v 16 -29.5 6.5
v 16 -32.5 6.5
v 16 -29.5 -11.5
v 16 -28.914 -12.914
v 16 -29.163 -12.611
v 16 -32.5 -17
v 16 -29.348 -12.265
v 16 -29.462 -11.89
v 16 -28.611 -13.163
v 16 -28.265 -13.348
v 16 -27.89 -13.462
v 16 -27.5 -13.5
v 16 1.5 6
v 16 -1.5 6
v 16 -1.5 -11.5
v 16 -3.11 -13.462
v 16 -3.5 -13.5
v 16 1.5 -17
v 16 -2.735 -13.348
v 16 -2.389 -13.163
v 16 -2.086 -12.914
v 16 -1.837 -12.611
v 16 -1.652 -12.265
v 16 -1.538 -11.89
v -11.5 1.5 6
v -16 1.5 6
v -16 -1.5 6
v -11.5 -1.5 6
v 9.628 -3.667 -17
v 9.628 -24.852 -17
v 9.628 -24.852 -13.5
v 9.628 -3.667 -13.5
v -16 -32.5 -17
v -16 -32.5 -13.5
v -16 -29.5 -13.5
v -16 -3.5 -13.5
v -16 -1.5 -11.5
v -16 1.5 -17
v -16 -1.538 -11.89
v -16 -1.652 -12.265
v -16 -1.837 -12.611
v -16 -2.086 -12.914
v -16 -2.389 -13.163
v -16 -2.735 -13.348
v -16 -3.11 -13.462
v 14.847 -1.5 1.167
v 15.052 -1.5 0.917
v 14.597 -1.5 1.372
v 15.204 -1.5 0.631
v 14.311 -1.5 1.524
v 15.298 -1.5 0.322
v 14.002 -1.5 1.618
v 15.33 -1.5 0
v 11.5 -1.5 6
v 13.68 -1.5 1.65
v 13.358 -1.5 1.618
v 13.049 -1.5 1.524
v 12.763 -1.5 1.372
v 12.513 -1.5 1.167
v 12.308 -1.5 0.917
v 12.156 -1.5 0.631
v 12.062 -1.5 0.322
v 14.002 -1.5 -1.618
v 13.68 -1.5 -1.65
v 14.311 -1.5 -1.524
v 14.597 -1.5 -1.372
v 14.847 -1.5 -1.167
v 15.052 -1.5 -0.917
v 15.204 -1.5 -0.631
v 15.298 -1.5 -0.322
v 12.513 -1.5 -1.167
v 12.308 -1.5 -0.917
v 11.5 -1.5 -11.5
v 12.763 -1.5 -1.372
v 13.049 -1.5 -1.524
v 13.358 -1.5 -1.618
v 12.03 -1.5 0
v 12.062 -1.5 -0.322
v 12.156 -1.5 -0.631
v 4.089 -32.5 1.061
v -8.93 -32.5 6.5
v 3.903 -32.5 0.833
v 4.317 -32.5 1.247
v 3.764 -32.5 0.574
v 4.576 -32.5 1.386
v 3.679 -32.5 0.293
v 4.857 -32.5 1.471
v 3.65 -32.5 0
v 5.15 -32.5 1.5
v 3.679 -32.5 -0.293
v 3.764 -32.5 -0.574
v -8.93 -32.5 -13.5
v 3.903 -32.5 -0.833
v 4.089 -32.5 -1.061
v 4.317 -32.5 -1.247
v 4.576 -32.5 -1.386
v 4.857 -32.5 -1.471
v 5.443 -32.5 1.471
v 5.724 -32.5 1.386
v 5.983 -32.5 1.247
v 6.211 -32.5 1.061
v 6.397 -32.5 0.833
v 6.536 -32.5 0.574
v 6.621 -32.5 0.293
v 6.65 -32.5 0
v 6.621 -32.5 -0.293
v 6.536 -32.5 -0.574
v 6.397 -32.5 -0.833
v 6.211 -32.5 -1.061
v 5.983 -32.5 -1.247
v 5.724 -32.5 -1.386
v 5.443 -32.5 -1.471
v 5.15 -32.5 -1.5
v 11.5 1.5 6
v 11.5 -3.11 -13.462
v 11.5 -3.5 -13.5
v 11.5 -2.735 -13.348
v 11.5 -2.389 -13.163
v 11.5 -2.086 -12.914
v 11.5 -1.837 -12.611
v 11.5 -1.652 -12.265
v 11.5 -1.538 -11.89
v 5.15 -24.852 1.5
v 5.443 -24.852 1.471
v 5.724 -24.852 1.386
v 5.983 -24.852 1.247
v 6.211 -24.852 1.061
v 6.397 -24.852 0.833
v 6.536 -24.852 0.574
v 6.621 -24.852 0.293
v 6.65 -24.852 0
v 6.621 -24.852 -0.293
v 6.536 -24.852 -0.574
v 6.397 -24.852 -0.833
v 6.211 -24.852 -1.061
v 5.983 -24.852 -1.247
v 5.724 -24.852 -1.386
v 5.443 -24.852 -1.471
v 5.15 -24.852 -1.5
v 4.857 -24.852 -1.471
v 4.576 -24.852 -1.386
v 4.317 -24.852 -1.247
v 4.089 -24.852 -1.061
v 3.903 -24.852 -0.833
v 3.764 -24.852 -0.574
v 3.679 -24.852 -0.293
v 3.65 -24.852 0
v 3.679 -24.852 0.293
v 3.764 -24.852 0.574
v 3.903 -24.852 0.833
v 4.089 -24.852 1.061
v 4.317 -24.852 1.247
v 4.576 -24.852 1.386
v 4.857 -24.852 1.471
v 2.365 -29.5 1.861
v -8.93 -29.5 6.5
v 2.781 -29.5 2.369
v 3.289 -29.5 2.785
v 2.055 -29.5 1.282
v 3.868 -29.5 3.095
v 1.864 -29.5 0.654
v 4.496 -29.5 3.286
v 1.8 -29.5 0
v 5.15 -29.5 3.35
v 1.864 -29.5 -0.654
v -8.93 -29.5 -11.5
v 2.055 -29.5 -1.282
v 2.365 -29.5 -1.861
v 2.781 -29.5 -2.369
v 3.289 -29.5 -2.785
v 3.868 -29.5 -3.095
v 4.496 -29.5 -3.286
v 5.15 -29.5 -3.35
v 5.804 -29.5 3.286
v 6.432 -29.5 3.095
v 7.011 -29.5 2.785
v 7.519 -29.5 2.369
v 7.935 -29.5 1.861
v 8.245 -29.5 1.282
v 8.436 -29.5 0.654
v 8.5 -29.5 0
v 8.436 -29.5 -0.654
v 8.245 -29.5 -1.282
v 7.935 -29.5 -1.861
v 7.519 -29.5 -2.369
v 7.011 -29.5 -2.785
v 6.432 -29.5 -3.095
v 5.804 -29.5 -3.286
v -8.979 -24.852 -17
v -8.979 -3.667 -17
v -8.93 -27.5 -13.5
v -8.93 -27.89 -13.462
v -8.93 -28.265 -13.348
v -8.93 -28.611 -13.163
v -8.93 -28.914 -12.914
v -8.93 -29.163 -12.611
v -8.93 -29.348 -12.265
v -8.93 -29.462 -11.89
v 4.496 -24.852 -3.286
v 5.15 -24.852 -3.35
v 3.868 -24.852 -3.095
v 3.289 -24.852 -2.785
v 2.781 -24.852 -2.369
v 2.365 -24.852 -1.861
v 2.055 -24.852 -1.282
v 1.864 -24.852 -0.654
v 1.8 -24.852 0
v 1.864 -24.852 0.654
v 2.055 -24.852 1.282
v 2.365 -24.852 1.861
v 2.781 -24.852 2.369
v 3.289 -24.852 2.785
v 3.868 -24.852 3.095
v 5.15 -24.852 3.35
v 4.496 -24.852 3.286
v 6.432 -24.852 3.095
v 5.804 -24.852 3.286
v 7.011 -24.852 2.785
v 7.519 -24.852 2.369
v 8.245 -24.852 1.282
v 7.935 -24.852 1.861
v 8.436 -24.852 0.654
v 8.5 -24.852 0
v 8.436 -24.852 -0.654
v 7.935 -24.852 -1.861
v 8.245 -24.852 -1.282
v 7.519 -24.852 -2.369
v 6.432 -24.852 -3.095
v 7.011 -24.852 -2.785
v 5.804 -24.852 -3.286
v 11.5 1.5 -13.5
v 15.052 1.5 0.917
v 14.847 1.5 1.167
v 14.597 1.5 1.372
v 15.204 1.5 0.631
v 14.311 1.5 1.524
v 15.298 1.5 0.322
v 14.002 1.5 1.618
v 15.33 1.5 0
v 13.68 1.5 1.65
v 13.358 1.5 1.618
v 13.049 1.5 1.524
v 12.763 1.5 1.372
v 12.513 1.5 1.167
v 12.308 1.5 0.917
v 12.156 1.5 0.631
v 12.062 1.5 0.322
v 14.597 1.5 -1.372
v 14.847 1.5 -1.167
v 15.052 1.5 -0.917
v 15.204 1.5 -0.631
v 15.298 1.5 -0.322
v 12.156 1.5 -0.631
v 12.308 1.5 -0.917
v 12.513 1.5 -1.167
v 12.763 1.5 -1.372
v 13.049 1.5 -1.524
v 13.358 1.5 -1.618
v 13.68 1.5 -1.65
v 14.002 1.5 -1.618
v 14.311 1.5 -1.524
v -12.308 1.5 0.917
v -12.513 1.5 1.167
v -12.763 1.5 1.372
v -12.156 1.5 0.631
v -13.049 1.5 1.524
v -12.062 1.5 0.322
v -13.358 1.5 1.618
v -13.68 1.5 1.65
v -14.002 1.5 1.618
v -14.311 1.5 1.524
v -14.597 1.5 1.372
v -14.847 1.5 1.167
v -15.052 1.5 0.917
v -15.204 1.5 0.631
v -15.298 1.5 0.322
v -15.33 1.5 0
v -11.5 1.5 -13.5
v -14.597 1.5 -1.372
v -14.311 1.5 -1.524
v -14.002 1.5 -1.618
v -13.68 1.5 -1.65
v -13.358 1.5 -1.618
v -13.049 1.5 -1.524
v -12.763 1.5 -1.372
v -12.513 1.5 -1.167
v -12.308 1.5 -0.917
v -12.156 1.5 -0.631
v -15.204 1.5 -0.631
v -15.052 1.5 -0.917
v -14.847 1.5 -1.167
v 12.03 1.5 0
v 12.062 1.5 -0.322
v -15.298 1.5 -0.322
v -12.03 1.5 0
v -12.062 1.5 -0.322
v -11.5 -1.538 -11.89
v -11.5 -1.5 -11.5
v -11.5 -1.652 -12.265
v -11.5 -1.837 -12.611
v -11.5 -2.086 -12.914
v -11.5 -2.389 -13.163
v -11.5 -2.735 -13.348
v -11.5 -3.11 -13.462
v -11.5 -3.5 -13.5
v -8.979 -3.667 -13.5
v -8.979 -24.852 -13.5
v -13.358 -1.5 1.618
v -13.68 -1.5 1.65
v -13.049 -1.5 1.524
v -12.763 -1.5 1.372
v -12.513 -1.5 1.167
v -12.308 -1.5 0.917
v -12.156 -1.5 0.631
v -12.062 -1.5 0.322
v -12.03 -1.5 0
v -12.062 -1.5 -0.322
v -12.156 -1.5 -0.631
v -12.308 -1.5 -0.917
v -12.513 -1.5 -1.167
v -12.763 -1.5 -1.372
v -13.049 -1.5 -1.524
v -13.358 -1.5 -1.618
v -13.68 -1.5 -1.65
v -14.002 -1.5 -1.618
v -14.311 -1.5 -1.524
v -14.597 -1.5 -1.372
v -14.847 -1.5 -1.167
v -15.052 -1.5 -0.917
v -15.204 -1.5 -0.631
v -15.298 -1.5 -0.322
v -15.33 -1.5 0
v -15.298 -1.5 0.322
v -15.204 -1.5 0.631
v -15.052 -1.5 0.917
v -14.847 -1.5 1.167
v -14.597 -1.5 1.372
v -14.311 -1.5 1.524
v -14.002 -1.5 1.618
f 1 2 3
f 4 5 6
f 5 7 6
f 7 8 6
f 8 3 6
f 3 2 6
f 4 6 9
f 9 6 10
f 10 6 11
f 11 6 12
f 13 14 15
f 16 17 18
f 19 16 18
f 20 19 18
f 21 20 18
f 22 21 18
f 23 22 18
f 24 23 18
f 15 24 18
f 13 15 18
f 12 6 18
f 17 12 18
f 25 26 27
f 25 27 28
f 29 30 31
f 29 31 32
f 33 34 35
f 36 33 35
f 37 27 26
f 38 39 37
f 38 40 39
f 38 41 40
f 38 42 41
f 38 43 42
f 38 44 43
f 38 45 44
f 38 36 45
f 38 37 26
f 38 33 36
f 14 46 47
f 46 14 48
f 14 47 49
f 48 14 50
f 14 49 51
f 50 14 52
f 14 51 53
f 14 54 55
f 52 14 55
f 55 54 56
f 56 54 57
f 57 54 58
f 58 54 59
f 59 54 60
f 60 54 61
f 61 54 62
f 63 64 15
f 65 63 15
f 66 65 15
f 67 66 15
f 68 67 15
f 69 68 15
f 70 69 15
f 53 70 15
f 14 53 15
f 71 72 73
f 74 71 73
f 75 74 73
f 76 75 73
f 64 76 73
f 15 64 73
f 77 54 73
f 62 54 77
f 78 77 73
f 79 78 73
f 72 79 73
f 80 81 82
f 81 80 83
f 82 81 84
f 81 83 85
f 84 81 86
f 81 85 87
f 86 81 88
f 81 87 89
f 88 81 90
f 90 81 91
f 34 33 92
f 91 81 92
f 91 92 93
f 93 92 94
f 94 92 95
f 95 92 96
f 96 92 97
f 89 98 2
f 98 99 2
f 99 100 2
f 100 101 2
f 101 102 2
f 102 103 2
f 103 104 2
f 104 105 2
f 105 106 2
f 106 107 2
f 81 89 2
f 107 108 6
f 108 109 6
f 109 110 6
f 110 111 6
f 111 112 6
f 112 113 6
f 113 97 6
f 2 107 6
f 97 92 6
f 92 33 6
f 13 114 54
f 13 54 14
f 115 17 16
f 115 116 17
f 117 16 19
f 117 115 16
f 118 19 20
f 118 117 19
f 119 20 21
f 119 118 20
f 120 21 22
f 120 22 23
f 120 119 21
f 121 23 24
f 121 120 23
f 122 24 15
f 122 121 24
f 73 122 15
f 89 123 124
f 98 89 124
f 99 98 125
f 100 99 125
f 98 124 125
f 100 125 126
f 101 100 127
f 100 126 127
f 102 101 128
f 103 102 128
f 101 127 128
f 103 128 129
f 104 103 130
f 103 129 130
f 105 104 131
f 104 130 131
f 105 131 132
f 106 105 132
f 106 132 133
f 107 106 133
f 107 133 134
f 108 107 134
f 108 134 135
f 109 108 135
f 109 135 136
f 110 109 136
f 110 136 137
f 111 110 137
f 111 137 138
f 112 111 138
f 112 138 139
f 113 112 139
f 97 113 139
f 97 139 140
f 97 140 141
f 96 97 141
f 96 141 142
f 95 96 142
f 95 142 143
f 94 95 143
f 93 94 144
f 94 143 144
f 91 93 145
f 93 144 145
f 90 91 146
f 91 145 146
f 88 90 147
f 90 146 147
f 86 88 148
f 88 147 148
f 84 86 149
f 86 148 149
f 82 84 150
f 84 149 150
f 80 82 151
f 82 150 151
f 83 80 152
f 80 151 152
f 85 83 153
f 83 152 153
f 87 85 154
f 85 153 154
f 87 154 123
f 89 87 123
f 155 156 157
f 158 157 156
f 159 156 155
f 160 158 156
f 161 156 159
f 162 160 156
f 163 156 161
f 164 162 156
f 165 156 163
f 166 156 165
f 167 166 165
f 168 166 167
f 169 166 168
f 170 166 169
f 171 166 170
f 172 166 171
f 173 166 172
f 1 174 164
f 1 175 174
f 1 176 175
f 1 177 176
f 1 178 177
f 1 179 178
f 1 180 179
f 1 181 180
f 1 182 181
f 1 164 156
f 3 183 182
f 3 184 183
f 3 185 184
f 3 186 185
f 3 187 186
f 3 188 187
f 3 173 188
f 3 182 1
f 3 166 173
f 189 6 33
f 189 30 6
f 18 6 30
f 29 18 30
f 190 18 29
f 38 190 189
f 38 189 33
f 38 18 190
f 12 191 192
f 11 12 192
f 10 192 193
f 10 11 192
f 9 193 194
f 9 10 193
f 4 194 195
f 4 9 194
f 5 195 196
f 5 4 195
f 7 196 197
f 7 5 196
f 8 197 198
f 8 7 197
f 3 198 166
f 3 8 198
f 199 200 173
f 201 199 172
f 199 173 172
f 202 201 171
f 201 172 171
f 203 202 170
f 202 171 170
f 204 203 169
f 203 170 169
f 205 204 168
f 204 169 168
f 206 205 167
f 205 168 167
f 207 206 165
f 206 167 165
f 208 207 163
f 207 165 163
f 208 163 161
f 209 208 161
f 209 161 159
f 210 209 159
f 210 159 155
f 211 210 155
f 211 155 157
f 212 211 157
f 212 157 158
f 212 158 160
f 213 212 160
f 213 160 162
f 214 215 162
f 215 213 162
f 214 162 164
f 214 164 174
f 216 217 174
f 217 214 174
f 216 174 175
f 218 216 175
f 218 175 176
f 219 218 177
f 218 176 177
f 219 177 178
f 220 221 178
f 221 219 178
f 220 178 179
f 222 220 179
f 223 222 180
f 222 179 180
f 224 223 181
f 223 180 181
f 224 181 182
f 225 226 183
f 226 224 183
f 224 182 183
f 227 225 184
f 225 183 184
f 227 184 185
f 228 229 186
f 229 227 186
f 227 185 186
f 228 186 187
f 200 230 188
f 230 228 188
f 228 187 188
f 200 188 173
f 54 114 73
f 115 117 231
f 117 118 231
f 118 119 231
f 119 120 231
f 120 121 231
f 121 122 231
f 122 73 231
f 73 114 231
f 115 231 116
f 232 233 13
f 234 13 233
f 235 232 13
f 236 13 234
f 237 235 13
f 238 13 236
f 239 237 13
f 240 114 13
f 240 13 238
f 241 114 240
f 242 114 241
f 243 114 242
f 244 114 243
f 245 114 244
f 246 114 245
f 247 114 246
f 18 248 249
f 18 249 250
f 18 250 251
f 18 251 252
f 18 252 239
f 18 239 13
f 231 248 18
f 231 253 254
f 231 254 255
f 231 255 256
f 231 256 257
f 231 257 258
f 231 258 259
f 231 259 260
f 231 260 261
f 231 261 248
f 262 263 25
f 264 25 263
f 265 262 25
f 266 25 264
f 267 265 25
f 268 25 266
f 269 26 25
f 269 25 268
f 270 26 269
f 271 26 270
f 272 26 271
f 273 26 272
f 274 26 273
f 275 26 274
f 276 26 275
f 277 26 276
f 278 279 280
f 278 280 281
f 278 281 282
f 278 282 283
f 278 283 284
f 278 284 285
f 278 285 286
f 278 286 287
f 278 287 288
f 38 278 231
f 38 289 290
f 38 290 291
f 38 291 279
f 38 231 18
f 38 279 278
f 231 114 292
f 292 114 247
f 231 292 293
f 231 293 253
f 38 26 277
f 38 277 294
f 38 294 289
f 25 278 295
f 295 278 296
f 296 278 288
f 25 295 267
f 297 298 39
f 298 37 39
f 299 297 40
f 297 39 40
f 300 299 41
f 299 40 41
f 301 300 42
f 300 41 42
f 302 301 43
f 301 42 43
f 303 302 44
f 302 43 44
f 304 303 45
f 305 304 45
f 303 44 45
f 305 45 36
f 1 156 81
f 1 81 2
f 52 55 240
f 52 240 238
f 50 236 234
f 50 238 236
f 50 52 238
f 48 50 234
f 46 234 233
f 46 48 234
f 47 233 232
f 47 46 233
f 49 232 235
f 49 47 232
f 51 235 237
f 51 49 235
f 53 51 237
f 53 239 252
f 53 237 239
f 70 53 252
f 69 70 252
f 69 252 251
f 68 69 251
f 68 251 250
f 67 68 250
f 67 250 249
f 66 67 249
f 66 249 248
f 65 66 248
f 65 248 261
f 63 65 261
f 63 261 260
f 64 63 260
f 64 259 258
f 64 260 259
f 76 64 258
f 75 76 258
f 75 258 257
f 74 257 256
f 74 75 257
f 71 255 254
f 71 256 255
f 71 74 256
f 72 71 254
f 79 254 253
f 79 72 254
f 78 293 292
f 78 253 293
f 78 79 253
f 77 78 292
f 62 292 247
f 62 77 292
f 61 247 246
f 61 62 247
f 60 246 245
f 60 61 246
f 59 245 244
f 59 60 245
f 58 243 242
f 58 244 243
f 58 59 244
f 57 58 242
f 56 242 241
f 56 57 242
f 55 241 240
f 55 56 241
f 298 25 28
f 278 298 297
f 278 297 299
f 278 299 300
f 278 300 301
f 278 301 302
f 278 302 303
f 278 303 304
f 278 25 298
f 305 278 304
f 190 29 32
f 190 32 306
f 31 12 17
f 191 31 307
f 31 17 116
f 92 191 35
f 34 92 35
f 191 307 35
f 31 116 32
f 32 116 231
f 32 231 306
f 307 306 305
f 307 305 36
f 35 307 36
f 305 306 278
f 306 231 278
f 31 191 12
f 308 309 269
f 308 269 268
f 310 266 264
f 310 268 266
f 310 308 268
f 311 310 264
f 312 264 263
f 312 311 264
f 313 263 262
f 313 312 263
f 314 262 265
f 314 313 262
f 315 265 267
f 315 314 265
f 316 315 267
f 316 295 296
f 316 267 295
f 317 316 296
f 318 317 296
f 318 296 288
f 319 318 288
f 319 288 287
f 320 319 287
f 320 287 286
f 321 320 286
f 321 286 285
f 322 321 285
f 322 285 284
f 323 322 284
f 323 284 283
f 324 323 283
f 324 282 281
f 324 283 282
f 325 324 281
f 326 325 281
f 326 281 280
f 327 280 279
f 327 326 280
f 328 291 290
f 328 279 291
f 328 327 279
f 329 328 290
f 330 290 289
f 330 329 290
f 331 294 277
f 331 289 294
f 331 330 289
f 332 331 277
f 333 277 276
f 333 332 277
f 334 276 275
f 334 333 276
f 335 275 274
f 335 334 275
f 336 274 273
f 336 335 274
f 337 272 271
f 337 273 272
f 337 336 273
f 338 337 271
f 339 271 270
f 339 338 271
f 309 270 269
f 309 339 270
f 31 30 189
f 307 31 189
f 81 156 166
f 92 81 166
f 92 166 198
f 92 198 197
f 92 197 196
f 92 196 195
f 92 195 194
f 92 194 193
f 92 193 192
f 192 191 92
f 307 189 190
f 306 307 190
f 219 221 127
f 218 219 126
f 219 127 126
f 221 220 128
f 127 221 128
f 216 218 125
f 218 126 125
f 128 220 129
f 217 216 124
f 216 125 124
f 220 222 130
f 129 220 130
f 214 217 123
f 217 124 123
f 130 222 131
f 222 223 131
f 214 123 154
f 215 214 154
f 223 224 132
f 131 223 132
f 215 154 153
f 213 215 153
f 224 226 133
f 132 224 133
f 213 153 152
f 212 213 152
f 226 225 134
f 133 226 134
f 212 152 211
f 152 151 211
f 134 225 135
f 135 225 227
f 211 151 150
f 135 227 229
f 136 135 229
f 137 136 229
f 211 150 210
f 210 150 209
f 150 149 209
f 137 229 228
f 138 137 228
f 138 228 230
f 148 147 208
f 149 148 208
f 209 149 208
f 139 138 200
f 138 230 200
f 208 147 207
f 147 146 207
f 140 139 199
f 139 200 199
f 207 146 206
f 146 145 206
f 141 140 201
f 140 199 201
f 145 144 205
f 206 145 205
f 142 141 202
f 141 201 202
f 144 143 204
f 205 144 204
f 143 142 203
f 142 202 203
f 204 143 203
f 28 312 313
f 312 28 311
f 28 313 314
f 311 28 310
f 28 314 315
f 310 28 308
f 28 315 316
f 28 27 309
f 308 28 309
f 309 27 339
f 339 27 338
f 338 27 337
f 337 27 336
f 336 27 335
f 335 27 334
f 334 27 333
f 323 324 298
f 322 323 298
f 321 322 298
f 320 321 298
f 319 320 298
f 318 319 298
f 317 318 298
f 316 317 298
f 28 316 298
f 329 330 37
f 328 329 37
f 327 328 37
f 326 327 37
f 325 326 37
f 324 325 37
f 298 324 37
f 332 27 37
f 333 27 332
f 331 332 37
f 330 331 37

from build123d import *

# Parameters (mm, degrees)
SKETCH_1_W               = 4.5
SKETCH_1_H               = 23
EXTRUDE_1_DEPTH          = 1.5
EXTRUDE_1_2_DEPTH        = 1.5
CUT_EXTRUDE_1_DEPTH      = 24.393375131
CUT_EXTRUDE_1_DEPTH_BACK = 24.393375131
SKETCH_2_R               = 1.65
SKETCH_4_W               = 3.5
SKETCH_4_H               = 3
EXTRUDE_3_DEPTH          = 23
SKETCH_5_W               = 32
SKETCH_5_H               = 3.5
EXTRUDE_4_DEPTH          = 31
SKETCH_6_W               = 32
SKETCH_6_H               = 3
EXTRUDE_5_DEPTH          = 20
SKETCH_8_R               = 3.35
EXTRUDE_6_DEPTH          = 6
CUT_EXTRUDE_2_REACH      = 36.205
SKETCH_9_R               = 1.5
SKETCH_10_W              = 18.606711353
SKETCH_10_H              = 21.185184653
CUT_EXTRUDE_3_DEPTH      = 44.179856415
SKETCH_11_W              = 7.069778579
SKETCH_11_H              = 20
CUT_EXTRUDE_4_DEPTH      = 10
FILLET_1_R               = 2


with BuildPart() as part:
    # 草图1 → 凸台-拉伸1 (new, symmetric)
    with BuildSketch(Plane(origin=(0, 0, 0), x_dir=(1, 0, 0), z_dir=(0, 1, 0))):
        with Locations((-13.75, 5.5)):
            Rectangle(SKETCH_1_W, SKETCH_1_H)
    extrude(amount=EXTRUDE_1_DEPTH, both=True)


with BuildPart() as body_2:
    # 草图1 → Extrude 1 2 (new, symmetric)
    with BuildSketch(Plane(origin=(0, 0, 0), x_dir=(1, 0, 0), z_dir=(0, 1, 0))):
        with Locations((13.75, 5.5)):
            Rectangle(SKETCH_1_W, SKETCH_1_H)
    extrude(amount=EXTRUDE_1_2_DEPTH, both=True)


with BuildPart() as cut_extrude_1_tool:
    # 草图2 → 切除-拉伸1 (new, two sides: drawn at the far end of the back side and taken through both)
    with BuildSketch(Plane(origin=(0, 0, 0), x_dir=(1, 0, 0), z_dir=(0, 1, 0)).offset(-CUT_EXTRUDE_1_DEPTH_BACK)):
        with Locations(Location((-13.68, 0, 0), (0, 0, 270))):
            Circle(SKETCH_2_R)
        with Locations(Location((13.68, 0, 0), (0, 0, 270))):
            Circle(SKETCH_2_R)
    extrude(amount=CUT_EXTRUDE_1_DEPTH + CUT_EXTRUDE_1_DEPTH_BACK)


with BuildPart() as part_1:
    add(part.part)

    # 切除-拉伸1: cut by cut_extrude_1_tool
    add(cut_extrude_1_tool.part, mode=Mode.SUBTRACT)



with BuildPart() as body_2_1:
    add(body_2.part)

    # 切除-拉伸1: cut by cut_extrude_1_tool
    add(cut_extrude_1_tool.part, mode=Mode.SUBTRACT)


with BuildPart() as body_3:
    # 草图4 → 凸台-拉伸3 (new body)
    with BuildSketch(Plane(origin=(-11.5, 0, 0), x_dir=(0, 0, -1), z_dir=(1, 0, 0))):
        with Locations((15.25, 0)):
            Rectangle(SKETCH_4_W, SKETCH_4_H)
    extrude(amount=EXTRUDE_3_DEPTH)


with BuildPart() as part_2:
    add(part_1.part)

    add(body_2_1.part)  # 凸台-拉伸4 merges body 2

    add(body_3.part)  # 凸台-拉伸4 merges body 3
    # 草图5 → 凸台-拉伸4 (add)
    with BuildSketch(Plane(origin=(0, -1.5, 0), x_dir=(-1, 0, 0), z_dir=(0, -1, 0))):
        with Locations((0, 15.25)):
            Rectangle(SKETCH_5_W, SKETCH_5_H)
    extrude(amount=EXTRUDE_4_DEPTH)

    # 草图6 → 凸台-拉伸5 (add)
    with BuildSketch(Plane.XY.offset(-13.5)):
        with Locations((0, -31)):
            Rectangle(SKETCH_6_W, SKETCH_6_H)
    extrude(amount=EXTRUDE_5_DEPTH)

    # 草图8 → 凸台-拉伸6 (add)
    with BuildSketch(Plane(origin=(0, -29.5, 0), x_dir=(1, 0, 0), z_dir=(0, 1, 0))):
        with Locations(Location((5.15, 0, 0), (0, 0, 90))):
            Circle(SKETCH_8_R)
    extrude(amount=EXTRUDE_6_DEPTH)

    # 草图9 → 切除-拉伸2 (cut, up to next)
    with BuildSketch(Plane(origin=(0, -23.5, 0), x_dir=(1, 0, 0), z_dir=(0, 1, 0)), mode=Mode.PRIVATE) as cut_extrude_2_sk1:
        with Locations(Location((5.15, 0, 0), (0, 0, 270))):
            Circle(SKETCH_9_R)
    cut_extrude_2_tool1 = extrude(cut_extrude_2_sk1.sketch, amount=-CUT_EXTRUDE_2_REACH, mode=Mode.PRIVATE) & part_2.part
    add(cut_extrude_2_tool1.solids().sort_by_distance((5.15, -23.5, 0))[0], mode=Mode.SUBTRACT)

    # 草图10 → 切除-拉伸3 (cut, through all)
    with BuildSketch(Plane(origin=(0, 0, -17), x_dir=(-1, 0, 0), z_dir=(0, 0, -1))):
        with Locations((-0.324302099, -14.259789027)):
            Rectangle(SKETCH_10_W, SKETCH_10_H)
    extrude(amount=-CUT_EXTRUDE_3_DEPTH, mode=Mode.SUBTRACT)

    # 草图11 → 切除-拉伸4 (cut)
    with BuildSketch(Plane(origin=(0, -29.5, 0), x_dir=(1, 0, 0), z_dir=(0, 1, 0))):
        with Locations((-12.46511071, 3.5)):
            Rectangle(SKETCH_11_W, SKETCH_11_H)
    extrude(amount=-CUT_EXTRUDE_4_DEPTH, mode=Mode.SUBTRACT)

    # 圆角1
    fillet_1_edges = [part_2.edges().sort_by_distance(p)[0] for p in [
        (-13.75, -1.5, -13.5),
        (13.75, -1.5, -13.5),
        (3.534889289, -29.5, -13.5),
    ]]
    fillet(fillet_1_edges, radius=FILLET_1_R)


solid = part_2.part
